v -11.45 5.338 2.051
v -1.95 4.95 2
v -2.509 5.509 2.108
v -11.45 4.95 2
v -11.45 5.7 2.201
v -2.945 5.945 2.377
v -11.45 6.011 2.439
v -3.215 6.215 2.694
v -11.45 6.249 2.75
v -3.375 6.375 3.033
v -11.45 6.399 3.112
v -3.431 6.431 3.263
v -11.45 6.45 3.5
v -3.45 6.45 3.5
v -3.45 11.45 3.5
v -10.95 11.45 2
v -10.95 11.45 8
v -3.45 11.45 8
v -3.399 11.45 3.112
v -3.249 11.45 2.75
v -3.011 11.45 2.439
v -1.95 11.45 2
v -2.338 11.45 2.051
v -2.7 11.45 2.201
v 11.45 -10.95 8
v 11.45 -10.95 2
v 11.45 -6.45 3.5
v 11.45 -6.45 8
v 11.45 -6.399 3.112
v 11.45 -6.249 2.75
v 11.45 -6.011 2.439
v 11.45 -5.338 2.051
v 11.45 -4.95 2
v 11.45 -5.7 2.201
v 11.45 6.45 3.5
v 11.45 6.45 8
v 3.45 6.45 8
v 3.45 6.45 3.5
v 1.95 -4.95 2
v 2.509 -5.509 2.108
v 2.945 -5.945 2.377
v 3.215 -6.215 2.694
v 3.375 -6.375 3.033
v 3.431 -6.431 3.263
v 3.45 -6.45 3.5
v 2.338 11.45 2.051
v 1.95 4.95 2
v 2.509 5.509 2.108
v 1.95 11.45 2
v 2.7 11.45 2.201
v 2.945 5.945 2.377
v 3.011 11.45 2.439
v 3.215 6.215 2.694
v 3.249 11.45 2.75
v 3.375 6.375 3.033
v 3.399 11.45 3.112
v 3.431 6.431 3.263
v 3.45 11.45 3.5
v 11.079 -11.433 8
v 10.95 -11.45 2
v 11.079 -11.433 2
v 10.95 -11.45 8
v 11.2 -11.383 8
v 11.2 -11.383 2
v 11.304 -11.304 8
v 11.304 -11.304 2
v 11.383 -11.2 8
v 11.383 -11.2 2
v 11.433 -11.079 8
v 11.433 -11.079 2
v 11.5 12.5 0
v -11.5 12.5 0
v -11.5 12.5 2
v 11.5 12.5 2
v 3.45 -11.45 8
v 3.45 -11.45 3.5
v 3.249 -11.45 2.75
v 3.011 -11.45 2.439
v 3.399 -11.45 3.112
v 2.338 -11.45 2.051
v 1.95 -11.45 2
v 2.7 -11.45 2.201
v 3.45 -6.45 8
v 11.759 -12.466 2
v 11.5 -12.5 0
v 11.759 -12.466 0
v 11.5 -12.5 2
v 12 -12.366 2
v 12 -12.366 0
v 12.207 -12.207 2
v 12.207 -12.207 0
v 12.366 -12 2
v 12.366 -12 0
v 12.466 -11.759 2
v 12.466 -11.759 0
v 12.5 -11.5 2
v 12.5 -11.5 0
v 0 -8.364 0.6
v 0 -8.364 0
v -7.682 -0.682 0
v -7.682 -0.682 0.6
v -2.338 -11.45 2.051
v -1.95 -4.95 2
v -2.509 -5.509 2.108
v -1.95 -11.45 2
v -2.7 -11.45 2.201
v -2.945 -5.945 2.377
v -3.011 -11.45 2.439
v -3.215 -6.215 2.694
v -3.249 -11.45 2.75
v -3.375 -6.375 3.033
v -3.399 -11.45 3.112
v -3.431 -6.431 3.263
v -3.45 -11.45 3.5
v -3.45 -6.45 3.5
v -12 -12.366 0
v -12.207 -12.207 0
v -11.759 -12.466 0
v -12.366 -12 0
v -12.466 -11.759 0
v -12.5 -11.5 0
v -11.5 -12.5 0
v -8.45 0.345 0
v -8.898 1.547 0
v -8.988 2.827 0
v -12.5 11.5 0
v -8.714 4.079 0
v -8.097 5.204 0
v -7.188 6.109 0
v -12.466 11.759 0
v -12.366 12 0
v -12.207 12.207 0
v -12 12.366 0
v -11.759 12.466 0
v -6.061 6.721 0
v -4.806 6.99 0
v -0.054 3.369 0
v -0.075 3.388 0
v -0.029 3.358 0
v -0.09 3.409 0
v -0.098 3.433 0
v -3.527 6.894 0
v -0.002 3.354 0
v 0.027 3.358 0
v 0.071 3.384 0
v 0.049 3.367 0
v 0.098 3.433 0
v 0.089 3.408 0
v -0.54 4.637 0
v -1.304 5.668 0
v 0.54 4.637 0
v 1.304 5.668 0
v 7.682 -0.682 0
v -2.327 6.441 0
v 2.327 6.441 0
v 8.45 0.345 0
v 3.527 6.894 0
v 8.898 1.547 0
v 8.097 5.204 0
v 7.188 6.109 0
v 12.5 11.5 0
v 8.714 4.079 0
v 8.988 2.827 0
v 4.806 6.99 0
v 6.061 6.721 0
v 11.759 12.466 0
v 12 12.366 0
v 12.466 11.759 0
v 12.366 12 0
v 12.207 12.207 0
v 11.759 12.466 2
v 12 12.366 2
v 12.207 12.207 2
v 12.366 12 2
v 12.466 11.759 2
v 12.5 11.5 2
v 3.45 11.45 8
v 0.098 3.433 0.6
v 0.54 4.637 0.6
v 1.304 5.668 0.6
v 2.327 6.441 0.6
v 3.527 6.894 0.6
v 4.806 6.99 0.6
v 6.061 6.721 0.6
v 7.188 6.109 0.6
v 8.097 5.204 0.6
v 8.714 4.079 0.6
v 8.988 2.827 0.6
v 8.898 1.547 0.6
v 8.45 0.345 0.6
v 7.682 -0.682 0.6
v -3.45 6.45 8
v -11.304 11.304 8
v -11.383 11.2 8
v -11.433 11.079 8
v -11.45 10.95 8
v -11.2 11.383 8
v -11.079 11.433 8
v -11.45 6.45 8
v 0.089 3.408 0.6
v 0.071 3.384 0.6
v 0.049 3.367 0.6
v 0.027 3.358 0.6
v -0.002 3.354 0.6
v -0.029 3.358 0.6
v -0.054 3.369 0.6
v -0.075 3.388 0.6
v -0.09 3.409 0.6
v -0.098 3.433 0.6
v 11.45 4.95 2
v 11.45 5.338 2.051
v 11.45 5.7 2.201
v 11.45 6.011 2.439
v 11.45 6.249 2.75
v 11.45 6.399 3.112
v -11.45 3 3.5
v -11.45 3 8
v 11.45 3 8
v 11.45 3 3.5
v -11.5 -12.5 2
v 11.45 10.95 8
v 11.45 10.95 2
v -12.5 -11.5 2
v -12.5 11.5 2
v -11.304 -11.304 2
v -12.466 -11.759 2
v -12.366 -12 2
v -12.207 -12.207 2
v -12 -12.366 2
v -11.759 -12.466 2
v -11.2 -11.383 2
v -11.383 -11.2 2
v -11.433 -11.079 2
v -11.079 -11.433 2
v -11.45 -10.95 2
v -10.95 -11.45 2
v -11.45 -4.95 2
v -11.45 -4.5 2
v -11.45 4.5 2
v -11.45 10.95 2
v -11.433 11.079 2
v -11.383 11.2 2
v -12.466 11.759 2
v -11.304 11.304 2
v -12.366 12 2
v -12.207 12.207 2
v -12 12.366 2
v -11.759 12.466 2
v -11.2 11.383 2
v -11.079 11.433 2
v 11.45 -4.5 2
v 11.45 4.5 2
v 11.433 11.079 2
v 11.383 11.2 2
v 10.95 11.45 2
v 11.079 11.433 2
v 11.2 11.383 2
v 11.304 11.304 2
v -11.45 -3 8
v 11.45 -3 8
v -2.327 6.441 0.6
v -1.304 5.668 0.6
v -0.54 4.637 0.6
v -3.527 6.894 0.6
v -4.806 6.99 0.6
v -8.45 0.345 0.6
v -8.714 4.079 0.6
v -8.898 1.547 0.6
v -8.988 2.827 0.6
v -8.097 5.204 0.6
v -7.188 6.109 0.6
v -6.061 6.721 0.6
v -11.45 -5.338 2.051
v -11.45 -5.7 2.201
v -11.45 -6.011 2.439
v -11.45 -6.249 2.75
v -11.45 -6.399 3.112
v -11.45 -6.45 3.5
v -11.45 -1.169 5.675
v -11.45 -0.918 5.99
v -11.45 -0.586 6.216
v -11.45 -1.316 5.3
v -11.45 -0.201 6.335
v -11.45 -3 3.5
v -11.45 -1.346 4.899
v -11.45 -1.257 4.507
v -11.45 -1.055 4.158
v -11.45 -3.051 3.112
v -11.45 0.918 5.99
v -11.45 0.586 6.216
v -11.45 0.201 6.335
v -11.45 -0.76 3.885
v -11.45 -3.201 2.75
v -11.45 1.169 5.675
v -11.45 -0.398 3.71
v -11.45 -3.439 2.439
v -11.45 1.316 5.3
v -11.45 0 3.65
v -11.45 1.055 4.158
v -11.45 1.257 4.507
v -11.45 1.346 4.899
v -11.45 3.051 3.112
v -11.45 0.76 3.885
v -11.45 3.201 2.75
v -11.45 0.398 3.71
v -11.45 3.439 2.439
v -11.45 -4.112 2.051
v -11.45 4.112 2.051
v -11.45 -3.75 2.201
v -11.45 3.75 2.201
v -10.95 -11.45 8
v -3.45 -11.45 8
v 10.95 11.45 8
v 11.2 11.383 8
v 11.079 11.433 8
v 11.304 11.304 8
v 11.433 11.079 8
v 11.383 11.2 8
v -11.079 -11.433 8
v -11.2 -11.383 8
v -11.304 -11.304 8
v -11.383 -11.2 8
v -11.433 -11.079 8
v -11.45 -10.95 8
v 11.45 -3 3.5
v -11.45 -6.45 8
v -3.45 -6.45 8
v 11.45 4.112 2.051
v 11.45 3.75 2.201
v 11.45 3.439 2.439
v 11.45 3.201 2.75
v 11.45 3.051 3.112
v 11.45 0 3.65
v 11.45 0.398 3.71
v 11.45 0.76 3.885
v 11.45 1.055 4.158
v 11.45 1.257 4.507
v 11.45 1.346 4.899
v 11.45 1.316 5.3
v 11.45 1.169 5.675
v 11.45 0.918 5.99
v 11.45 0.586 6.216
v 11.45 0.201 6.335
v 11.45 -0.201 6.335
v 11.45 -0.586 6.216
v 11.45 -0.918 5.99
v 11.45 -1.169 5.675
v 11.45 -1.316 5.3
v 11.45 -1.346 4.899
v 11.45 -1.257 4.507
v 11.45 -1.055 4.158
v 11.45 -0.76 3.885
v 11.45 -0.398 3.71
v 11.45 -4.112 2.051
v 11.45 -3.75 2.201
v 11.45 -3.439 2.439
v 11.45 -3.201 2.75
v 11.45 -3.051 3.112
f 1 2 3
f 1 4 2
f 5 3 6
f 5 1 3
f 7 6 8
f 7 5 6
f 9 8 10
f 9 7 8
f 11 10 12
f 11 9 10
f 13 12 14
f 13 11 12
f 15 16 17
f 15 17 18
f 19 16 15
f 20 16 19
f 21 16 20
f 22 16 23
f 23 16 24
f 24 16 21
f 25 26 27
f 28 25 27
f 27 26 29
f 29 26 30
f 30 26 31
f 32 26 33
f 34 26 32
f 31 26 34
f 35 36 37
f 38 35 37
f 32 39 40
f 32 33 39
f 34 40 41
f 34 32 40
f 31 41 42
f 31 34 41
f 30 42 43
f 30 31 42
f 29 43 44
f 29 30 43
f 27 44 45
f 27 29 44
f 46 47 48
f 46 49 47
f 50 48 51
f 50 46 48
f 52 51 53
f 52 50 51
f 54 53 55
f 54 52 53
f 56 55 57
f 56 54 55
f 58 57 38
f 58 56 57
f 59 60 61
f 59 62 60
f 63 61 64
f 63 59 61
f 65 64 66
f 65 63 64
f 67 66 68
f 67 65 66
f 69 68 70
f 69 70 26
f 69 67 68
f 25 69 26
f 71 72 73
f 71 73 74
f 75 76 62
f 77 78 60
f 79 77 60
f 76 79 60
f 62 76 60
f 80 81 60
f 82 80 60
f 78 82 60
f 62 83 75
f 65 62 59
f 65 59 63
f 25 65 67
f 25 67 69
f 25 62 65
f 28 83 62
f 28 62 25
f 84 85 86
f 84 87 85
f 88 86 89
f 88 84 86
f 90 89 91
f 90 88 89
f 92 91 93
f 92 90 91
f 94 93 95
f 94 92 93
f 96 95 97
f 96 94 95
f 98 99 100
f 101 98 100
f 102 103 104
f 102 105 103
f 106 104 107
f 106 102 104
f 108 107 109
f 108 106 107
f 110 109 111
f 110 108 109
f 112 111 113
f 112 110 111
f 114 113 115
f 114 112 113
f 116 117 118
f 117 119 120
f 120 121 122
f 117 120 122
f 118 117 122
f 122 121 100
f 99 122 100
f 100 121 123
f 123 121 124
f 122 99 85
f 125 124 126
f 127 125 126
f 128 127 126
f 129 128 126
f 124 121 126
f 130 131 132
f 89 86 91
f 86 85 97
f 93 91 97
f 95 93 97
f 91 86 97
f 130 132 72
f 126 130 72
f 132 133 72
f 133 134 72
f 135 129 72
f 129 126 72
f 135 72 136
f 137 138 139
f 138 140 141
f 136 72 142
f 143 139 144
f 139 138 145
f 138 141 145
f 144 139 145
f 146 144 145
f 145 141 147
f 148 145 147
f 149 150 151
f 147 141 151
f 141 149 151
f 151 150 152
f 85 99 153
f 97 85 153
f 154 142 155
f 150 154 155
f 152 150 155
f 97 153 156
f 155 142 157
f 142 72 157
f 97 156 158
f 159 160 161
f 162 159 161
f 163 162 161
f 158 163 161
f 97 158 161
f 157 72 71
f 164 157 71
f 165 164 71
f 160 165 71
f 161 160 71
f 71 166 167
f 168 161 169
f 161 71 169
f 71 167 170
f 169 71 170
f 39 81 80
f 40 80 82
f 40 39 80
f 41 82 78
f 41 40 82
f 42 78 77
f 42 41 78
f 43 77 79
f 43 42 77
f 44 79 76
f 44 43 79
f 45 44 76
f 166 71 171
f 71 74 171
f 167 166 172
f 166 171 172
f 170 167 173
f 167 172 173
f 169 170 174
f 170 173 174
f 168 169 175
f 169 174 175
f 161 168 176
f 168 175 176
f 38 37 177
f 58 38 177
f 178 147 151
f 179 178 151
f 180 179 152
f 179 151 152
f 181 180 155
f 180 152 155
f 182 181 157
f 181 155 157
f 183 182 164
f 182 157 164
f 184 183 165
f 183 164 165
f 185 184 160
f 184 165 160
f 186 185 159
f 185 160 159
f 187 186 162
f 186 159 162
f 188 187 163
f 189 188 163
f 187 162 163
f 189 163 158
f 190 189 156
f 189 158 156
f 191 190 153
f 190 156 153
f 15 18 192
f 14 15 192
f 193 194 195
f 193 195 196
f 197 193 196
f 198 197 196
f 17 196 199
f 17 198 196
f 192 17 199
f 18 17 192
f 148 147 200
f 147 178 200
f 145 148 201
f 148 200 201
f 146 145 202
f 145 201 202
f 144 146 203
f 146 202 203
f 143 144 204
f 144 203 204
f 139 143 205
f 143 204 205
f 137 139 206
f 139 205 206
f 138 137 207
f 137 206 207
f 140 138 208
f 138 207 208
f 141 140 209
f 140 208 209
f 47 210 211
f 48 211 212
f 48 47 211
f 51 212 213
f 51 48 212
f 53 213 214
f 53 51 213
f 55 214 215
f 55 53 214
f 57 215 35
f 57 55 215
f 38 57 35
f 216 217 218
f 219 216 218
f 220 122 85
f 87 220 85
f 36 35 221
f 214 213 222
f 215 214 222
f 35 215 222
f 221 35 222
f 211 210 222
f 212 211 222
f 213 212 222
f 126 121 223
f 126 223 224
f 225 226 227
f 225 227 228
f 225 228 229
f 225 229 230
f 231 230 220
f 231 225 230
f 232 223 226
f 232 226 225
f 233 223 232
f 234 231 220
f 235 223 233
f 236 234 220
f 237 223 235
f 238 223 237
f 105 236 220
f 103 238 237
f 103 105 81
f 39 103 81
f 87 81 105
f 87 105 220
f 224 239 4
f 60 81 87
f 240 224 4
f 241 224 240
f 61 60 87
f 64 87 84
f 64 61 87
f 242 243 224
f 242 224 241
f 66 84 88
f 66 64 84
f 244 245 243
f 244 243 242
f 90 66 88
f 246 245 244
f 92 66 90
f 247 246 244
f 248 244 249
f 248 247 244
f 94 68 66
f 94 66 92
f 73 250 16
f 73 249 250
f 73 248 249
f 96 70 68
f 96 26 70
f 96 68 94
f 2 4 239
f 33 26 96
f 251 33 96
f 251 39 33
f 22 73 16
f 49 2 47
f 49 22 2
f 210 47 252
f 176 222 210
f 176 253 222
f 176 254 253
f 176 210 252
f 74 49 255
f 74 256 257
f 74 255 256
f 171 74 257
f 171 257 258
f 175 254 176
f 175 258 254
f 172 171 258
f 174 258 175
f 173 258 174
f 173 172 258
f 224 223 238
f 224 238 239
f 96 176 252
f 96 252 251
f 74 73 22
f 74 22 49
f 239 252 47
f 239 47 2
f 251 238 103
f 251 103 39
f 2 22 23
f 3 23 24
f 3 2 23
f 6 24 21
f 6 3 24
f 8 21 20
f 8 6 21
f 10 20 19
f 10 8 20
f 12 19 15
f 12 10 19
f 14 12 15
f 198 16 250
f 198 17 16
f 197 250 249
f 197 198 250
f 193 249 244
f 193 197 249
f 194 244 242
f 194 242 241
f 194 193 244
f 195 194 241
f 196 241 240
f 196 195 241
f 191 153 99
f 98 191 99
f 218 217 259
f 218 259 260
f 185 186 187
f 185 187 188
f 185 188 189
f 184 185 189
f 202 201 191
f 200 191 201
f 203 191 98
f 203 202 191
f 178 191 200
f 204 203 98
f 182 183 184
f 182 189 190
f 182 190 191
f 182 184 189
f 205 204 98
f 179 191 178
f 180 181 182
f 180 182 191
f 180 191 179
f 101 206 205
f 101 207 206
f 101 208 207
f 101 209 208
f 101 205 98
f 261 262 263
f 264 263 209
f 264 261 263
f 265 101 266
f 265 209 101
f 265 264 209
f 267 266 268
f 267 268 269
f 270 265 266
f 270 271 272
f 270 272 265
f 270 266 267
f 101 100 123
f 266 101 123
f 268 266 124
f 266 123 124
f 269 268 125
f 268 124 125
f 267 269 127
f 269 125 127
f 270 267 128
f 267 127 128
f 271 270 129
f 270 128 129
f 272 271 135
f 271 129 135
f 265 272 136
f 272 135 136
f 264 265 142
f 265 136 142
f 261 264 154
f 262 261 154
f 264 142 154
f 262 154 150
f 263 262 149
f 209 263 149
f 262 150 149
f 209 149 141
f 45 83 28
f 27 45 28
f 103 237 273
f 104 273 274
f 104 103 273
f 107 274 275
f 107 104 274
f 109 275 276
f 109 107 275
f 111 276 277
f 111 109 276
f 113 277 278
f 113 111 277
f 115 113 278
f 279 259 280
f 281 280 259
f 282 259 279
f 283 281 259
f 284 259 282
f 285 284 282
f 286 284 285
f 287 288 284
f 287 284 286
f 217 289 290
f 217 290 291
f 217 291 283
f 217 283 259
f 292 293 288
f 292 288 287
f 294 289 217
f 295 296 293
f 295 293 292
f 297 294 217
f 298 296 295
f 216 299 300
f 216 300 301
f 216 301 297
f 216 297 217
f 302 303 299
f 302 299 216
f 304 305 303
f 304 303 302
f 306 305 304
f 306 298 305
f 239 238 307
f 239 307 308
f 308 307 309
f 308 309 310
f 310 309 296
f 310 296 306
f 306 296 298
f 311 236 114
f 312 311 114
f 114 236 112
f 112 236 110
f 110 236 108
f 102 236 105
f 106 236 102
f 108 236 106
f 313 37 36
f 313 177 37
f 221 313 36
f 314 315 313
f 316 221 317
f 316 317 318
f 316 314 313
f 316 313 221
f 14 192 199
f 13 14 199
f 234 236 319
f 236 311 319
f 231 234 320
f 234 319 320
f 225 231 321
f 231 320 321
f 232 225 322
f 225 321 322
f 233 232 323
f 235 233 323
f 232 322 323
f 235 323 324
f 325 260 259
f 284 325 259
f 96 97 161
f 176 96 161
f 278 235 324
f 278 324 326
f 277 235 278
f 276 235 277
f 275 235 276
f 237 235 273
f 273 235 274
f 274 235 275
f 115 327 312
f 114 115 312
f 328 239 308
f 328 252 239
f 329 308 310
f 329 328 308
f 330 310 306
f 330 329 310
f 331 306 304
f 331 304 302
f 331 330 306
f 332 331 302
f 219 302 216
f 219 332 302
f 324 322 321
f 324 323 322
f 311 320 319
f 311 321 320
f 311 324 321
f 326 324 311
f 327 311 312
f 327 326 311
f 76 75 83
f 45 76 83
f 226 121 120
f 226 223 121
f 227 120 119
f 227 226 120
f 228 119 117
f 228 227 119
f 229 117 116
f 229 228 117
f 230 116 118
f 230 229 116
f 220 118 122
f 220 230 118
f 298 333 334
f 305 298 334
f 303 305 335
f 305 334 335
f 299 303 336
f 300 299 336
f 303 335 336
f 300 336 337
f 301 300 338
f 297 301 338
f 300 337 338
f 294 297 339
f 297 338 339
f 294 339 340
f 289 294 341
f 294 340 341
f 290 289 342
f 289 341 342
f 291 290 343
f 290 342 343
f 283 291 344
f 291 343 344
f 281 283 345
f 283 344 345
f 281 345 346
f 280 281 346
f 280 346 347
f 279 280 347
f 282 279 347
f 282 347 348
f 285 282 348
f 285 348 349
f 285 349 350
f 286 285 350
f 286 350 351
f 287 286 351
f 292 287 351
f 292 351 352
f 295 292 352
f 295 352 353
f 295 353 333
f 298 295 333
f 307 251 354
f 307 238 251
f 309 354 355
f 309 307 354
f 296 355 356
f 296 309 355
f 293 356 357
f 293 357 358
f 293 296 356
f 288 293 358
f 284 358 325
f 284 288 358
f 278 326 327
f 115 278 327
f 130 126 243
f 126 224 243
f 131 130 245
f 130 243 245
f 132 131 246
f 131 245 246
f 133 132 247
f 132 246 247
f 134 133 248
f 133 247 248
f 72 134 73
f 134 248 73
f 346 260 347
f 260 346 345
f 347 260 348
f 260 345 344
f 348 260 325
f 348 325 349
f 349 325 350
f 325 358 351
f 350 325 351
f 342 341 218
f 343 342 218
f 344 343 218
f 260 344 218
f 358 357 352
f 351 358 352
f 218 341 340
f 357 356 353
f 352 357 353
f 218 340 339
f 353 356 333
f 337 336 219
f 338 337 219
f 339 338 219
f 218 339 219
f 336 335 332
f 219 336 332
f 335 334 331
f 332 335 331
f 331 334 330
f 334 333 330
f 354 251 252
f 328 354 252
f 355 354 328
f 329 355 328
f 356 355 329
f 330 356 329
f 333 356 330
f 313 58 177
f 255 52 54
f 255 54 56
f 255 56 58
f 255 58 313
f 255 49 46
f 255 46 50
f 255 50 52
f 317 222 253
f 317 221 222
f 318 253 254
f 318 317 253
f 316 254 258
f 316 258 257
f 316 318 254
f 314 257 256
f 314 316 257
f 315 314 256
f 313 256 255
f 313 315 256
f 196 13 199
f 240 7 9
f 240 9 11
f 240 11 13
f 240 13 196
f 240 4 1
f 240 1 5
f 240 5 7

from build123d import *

# Parameters (mm, degrees)
SKETCH_1_W          = 25
SKETCH_1_H          = 25
EXTRUDE_1_DEPTH     = 2
SKETCH_2_W          = 22.9
SKETCH_2_H          = 22.9
EXTRUDE_2_DEPTH     = 6
FILLET_1_R          = 1
CUT_EXTRUDE_3_DEPTH = 0.6
FILLET_2_R          = 0.5
FILLET_3_R          = 0.1
SKETCH_7_R          = 1.35
CUT_EXTRUDE_4_DEPTH = 29.175388325
CUT_EXTRUDE_5_DEPTH = 6
FILLET_4_R          = 1.5


with BuildPart() as part:
    # 草图1 → 凸台-拉伸1 (new body)
    with BuildSketch(Plane.XY):
        Rectangle(SKETCH_1_W, SKETCH_1_H)
    extrude(amount=EXTRUDE_1_DEPTH)

    # 草图2 → 凸台-拉伸2 (add)
    with BuildSketch(Plane.XY.offset(2)):
        Rectangle(SKETCH_2_W, SKETCH_2_H)
    extrude(amount=EXTRUDE_2_DEPTH)

    # 圆角1
    fillet_1_edges = [part.edges().sort_by_distance(p)[0] for p in [
        (-12.5, 12.5, 1),
        (12.5, 12.5, 1),
        (12.5, -12.5, 1),
        (-12.5, -12.5, 1),
    ]]
    fillet(fillet_1_edges, radius=FILLET_1_R)

    # 草图6 → 切除-拉伸3 (cut)
    with BuildSketch(Plane(origin=(0, 0, 0), x_dir=(-1, 0, 0), z_dir=(0, 0, -1))):
        with BuildLine():
            Line((-7.681980515, -0.681980515), (0, -8.363961031))
            Line((0, -8.363961031), (7.681980515, -0.681980515))
            ThreePointArc((7.681980515, -0.681980515), (6.222075446, 6.657457896), (0, 2.5))
            ThreePointArc((0, 2.5), (-6.222075446, 6.657457896), (-7.681980515, -0.681980515))
        make_face()
    extrude(amount=-CUT_EXTRUDE_3_DEPTH, mode=Mode.SUBTRACT)

    # 圆角2
    fillet_2_edges = [part.edges().sort_by_distance(p)[0] for p in [
        (11.45, -11.45, 5),
        (11.45, 11.45, 5),
        (-11.45, 11.45, 5),
        (-11.45, -11.45, 5),
    ]]
    fillet(fillet_2_edges, radius=FILLET_2_R)

    # 圆角3
    fillet_3_edges = [part.edges().sort_by_distance(p)[0] for p in [
        (0, 2.5, 0.3),
    ]]
    fillet(fillet_3_edges, radius=FILLET_3_R)

    # 草图7 → 切除-拉伸4 (cut, through all)
    with BuildSketch(Plane(origin=(11.45, 0, 0), x_dir=(0, 0, -1), z_dir=(1, 0, 0))):
        with Locations((-5, 0)):
            Circle(SKETCH_7_R)
    extrude(amount=-CUT_EXTRUDE_4_DEPTH, mode=Mode.SUBTRACT)

    # 草图8 → 切除-拉伸5 (cut)
    with BuildSketch(Plane.XY.offset(8)):
        Polygon((-11.45, 3), (11.45, 3), (11.45, 6.45), (3.45, 6.45), (3.45, 11.45), (-3.45, 11.45), (-3.45, 6.45), (-11.45, 6.45), align=None)
        Polygon((-11.45, -6.45), (-3.45, -6.45), (-3.45, -11.45), (3.45, -11.45), (3.45, -6.45), (11.45, -6.45), (11.45, -3), (-11.45, -3), align=None)
    extrude(amount=-CUT_EXTRUDE_5_DEPTH, mode=Mode.SUBTRACT)

    # 圆角4
    fillet_4_edges = [part.edges().sort_by_distance(p)[0] for p in [
        (7.45, 6.45, 2),
        (0, 3, 2),
        (-7.45, 6.45, 2),
        (-3.45, 8.95, 2),
        (3.45, 8.95, 2),
        (0, -3, 2),
        (7.45, -6.45, 2),
        (3.45, -8.95, 2),
        (-3.45, -8.95, 2),
        (-7.45, -6.45, 2),
    ]]
    fillet(fillet_4_edges, radius=FILLET_4_R)


solid = part.part
